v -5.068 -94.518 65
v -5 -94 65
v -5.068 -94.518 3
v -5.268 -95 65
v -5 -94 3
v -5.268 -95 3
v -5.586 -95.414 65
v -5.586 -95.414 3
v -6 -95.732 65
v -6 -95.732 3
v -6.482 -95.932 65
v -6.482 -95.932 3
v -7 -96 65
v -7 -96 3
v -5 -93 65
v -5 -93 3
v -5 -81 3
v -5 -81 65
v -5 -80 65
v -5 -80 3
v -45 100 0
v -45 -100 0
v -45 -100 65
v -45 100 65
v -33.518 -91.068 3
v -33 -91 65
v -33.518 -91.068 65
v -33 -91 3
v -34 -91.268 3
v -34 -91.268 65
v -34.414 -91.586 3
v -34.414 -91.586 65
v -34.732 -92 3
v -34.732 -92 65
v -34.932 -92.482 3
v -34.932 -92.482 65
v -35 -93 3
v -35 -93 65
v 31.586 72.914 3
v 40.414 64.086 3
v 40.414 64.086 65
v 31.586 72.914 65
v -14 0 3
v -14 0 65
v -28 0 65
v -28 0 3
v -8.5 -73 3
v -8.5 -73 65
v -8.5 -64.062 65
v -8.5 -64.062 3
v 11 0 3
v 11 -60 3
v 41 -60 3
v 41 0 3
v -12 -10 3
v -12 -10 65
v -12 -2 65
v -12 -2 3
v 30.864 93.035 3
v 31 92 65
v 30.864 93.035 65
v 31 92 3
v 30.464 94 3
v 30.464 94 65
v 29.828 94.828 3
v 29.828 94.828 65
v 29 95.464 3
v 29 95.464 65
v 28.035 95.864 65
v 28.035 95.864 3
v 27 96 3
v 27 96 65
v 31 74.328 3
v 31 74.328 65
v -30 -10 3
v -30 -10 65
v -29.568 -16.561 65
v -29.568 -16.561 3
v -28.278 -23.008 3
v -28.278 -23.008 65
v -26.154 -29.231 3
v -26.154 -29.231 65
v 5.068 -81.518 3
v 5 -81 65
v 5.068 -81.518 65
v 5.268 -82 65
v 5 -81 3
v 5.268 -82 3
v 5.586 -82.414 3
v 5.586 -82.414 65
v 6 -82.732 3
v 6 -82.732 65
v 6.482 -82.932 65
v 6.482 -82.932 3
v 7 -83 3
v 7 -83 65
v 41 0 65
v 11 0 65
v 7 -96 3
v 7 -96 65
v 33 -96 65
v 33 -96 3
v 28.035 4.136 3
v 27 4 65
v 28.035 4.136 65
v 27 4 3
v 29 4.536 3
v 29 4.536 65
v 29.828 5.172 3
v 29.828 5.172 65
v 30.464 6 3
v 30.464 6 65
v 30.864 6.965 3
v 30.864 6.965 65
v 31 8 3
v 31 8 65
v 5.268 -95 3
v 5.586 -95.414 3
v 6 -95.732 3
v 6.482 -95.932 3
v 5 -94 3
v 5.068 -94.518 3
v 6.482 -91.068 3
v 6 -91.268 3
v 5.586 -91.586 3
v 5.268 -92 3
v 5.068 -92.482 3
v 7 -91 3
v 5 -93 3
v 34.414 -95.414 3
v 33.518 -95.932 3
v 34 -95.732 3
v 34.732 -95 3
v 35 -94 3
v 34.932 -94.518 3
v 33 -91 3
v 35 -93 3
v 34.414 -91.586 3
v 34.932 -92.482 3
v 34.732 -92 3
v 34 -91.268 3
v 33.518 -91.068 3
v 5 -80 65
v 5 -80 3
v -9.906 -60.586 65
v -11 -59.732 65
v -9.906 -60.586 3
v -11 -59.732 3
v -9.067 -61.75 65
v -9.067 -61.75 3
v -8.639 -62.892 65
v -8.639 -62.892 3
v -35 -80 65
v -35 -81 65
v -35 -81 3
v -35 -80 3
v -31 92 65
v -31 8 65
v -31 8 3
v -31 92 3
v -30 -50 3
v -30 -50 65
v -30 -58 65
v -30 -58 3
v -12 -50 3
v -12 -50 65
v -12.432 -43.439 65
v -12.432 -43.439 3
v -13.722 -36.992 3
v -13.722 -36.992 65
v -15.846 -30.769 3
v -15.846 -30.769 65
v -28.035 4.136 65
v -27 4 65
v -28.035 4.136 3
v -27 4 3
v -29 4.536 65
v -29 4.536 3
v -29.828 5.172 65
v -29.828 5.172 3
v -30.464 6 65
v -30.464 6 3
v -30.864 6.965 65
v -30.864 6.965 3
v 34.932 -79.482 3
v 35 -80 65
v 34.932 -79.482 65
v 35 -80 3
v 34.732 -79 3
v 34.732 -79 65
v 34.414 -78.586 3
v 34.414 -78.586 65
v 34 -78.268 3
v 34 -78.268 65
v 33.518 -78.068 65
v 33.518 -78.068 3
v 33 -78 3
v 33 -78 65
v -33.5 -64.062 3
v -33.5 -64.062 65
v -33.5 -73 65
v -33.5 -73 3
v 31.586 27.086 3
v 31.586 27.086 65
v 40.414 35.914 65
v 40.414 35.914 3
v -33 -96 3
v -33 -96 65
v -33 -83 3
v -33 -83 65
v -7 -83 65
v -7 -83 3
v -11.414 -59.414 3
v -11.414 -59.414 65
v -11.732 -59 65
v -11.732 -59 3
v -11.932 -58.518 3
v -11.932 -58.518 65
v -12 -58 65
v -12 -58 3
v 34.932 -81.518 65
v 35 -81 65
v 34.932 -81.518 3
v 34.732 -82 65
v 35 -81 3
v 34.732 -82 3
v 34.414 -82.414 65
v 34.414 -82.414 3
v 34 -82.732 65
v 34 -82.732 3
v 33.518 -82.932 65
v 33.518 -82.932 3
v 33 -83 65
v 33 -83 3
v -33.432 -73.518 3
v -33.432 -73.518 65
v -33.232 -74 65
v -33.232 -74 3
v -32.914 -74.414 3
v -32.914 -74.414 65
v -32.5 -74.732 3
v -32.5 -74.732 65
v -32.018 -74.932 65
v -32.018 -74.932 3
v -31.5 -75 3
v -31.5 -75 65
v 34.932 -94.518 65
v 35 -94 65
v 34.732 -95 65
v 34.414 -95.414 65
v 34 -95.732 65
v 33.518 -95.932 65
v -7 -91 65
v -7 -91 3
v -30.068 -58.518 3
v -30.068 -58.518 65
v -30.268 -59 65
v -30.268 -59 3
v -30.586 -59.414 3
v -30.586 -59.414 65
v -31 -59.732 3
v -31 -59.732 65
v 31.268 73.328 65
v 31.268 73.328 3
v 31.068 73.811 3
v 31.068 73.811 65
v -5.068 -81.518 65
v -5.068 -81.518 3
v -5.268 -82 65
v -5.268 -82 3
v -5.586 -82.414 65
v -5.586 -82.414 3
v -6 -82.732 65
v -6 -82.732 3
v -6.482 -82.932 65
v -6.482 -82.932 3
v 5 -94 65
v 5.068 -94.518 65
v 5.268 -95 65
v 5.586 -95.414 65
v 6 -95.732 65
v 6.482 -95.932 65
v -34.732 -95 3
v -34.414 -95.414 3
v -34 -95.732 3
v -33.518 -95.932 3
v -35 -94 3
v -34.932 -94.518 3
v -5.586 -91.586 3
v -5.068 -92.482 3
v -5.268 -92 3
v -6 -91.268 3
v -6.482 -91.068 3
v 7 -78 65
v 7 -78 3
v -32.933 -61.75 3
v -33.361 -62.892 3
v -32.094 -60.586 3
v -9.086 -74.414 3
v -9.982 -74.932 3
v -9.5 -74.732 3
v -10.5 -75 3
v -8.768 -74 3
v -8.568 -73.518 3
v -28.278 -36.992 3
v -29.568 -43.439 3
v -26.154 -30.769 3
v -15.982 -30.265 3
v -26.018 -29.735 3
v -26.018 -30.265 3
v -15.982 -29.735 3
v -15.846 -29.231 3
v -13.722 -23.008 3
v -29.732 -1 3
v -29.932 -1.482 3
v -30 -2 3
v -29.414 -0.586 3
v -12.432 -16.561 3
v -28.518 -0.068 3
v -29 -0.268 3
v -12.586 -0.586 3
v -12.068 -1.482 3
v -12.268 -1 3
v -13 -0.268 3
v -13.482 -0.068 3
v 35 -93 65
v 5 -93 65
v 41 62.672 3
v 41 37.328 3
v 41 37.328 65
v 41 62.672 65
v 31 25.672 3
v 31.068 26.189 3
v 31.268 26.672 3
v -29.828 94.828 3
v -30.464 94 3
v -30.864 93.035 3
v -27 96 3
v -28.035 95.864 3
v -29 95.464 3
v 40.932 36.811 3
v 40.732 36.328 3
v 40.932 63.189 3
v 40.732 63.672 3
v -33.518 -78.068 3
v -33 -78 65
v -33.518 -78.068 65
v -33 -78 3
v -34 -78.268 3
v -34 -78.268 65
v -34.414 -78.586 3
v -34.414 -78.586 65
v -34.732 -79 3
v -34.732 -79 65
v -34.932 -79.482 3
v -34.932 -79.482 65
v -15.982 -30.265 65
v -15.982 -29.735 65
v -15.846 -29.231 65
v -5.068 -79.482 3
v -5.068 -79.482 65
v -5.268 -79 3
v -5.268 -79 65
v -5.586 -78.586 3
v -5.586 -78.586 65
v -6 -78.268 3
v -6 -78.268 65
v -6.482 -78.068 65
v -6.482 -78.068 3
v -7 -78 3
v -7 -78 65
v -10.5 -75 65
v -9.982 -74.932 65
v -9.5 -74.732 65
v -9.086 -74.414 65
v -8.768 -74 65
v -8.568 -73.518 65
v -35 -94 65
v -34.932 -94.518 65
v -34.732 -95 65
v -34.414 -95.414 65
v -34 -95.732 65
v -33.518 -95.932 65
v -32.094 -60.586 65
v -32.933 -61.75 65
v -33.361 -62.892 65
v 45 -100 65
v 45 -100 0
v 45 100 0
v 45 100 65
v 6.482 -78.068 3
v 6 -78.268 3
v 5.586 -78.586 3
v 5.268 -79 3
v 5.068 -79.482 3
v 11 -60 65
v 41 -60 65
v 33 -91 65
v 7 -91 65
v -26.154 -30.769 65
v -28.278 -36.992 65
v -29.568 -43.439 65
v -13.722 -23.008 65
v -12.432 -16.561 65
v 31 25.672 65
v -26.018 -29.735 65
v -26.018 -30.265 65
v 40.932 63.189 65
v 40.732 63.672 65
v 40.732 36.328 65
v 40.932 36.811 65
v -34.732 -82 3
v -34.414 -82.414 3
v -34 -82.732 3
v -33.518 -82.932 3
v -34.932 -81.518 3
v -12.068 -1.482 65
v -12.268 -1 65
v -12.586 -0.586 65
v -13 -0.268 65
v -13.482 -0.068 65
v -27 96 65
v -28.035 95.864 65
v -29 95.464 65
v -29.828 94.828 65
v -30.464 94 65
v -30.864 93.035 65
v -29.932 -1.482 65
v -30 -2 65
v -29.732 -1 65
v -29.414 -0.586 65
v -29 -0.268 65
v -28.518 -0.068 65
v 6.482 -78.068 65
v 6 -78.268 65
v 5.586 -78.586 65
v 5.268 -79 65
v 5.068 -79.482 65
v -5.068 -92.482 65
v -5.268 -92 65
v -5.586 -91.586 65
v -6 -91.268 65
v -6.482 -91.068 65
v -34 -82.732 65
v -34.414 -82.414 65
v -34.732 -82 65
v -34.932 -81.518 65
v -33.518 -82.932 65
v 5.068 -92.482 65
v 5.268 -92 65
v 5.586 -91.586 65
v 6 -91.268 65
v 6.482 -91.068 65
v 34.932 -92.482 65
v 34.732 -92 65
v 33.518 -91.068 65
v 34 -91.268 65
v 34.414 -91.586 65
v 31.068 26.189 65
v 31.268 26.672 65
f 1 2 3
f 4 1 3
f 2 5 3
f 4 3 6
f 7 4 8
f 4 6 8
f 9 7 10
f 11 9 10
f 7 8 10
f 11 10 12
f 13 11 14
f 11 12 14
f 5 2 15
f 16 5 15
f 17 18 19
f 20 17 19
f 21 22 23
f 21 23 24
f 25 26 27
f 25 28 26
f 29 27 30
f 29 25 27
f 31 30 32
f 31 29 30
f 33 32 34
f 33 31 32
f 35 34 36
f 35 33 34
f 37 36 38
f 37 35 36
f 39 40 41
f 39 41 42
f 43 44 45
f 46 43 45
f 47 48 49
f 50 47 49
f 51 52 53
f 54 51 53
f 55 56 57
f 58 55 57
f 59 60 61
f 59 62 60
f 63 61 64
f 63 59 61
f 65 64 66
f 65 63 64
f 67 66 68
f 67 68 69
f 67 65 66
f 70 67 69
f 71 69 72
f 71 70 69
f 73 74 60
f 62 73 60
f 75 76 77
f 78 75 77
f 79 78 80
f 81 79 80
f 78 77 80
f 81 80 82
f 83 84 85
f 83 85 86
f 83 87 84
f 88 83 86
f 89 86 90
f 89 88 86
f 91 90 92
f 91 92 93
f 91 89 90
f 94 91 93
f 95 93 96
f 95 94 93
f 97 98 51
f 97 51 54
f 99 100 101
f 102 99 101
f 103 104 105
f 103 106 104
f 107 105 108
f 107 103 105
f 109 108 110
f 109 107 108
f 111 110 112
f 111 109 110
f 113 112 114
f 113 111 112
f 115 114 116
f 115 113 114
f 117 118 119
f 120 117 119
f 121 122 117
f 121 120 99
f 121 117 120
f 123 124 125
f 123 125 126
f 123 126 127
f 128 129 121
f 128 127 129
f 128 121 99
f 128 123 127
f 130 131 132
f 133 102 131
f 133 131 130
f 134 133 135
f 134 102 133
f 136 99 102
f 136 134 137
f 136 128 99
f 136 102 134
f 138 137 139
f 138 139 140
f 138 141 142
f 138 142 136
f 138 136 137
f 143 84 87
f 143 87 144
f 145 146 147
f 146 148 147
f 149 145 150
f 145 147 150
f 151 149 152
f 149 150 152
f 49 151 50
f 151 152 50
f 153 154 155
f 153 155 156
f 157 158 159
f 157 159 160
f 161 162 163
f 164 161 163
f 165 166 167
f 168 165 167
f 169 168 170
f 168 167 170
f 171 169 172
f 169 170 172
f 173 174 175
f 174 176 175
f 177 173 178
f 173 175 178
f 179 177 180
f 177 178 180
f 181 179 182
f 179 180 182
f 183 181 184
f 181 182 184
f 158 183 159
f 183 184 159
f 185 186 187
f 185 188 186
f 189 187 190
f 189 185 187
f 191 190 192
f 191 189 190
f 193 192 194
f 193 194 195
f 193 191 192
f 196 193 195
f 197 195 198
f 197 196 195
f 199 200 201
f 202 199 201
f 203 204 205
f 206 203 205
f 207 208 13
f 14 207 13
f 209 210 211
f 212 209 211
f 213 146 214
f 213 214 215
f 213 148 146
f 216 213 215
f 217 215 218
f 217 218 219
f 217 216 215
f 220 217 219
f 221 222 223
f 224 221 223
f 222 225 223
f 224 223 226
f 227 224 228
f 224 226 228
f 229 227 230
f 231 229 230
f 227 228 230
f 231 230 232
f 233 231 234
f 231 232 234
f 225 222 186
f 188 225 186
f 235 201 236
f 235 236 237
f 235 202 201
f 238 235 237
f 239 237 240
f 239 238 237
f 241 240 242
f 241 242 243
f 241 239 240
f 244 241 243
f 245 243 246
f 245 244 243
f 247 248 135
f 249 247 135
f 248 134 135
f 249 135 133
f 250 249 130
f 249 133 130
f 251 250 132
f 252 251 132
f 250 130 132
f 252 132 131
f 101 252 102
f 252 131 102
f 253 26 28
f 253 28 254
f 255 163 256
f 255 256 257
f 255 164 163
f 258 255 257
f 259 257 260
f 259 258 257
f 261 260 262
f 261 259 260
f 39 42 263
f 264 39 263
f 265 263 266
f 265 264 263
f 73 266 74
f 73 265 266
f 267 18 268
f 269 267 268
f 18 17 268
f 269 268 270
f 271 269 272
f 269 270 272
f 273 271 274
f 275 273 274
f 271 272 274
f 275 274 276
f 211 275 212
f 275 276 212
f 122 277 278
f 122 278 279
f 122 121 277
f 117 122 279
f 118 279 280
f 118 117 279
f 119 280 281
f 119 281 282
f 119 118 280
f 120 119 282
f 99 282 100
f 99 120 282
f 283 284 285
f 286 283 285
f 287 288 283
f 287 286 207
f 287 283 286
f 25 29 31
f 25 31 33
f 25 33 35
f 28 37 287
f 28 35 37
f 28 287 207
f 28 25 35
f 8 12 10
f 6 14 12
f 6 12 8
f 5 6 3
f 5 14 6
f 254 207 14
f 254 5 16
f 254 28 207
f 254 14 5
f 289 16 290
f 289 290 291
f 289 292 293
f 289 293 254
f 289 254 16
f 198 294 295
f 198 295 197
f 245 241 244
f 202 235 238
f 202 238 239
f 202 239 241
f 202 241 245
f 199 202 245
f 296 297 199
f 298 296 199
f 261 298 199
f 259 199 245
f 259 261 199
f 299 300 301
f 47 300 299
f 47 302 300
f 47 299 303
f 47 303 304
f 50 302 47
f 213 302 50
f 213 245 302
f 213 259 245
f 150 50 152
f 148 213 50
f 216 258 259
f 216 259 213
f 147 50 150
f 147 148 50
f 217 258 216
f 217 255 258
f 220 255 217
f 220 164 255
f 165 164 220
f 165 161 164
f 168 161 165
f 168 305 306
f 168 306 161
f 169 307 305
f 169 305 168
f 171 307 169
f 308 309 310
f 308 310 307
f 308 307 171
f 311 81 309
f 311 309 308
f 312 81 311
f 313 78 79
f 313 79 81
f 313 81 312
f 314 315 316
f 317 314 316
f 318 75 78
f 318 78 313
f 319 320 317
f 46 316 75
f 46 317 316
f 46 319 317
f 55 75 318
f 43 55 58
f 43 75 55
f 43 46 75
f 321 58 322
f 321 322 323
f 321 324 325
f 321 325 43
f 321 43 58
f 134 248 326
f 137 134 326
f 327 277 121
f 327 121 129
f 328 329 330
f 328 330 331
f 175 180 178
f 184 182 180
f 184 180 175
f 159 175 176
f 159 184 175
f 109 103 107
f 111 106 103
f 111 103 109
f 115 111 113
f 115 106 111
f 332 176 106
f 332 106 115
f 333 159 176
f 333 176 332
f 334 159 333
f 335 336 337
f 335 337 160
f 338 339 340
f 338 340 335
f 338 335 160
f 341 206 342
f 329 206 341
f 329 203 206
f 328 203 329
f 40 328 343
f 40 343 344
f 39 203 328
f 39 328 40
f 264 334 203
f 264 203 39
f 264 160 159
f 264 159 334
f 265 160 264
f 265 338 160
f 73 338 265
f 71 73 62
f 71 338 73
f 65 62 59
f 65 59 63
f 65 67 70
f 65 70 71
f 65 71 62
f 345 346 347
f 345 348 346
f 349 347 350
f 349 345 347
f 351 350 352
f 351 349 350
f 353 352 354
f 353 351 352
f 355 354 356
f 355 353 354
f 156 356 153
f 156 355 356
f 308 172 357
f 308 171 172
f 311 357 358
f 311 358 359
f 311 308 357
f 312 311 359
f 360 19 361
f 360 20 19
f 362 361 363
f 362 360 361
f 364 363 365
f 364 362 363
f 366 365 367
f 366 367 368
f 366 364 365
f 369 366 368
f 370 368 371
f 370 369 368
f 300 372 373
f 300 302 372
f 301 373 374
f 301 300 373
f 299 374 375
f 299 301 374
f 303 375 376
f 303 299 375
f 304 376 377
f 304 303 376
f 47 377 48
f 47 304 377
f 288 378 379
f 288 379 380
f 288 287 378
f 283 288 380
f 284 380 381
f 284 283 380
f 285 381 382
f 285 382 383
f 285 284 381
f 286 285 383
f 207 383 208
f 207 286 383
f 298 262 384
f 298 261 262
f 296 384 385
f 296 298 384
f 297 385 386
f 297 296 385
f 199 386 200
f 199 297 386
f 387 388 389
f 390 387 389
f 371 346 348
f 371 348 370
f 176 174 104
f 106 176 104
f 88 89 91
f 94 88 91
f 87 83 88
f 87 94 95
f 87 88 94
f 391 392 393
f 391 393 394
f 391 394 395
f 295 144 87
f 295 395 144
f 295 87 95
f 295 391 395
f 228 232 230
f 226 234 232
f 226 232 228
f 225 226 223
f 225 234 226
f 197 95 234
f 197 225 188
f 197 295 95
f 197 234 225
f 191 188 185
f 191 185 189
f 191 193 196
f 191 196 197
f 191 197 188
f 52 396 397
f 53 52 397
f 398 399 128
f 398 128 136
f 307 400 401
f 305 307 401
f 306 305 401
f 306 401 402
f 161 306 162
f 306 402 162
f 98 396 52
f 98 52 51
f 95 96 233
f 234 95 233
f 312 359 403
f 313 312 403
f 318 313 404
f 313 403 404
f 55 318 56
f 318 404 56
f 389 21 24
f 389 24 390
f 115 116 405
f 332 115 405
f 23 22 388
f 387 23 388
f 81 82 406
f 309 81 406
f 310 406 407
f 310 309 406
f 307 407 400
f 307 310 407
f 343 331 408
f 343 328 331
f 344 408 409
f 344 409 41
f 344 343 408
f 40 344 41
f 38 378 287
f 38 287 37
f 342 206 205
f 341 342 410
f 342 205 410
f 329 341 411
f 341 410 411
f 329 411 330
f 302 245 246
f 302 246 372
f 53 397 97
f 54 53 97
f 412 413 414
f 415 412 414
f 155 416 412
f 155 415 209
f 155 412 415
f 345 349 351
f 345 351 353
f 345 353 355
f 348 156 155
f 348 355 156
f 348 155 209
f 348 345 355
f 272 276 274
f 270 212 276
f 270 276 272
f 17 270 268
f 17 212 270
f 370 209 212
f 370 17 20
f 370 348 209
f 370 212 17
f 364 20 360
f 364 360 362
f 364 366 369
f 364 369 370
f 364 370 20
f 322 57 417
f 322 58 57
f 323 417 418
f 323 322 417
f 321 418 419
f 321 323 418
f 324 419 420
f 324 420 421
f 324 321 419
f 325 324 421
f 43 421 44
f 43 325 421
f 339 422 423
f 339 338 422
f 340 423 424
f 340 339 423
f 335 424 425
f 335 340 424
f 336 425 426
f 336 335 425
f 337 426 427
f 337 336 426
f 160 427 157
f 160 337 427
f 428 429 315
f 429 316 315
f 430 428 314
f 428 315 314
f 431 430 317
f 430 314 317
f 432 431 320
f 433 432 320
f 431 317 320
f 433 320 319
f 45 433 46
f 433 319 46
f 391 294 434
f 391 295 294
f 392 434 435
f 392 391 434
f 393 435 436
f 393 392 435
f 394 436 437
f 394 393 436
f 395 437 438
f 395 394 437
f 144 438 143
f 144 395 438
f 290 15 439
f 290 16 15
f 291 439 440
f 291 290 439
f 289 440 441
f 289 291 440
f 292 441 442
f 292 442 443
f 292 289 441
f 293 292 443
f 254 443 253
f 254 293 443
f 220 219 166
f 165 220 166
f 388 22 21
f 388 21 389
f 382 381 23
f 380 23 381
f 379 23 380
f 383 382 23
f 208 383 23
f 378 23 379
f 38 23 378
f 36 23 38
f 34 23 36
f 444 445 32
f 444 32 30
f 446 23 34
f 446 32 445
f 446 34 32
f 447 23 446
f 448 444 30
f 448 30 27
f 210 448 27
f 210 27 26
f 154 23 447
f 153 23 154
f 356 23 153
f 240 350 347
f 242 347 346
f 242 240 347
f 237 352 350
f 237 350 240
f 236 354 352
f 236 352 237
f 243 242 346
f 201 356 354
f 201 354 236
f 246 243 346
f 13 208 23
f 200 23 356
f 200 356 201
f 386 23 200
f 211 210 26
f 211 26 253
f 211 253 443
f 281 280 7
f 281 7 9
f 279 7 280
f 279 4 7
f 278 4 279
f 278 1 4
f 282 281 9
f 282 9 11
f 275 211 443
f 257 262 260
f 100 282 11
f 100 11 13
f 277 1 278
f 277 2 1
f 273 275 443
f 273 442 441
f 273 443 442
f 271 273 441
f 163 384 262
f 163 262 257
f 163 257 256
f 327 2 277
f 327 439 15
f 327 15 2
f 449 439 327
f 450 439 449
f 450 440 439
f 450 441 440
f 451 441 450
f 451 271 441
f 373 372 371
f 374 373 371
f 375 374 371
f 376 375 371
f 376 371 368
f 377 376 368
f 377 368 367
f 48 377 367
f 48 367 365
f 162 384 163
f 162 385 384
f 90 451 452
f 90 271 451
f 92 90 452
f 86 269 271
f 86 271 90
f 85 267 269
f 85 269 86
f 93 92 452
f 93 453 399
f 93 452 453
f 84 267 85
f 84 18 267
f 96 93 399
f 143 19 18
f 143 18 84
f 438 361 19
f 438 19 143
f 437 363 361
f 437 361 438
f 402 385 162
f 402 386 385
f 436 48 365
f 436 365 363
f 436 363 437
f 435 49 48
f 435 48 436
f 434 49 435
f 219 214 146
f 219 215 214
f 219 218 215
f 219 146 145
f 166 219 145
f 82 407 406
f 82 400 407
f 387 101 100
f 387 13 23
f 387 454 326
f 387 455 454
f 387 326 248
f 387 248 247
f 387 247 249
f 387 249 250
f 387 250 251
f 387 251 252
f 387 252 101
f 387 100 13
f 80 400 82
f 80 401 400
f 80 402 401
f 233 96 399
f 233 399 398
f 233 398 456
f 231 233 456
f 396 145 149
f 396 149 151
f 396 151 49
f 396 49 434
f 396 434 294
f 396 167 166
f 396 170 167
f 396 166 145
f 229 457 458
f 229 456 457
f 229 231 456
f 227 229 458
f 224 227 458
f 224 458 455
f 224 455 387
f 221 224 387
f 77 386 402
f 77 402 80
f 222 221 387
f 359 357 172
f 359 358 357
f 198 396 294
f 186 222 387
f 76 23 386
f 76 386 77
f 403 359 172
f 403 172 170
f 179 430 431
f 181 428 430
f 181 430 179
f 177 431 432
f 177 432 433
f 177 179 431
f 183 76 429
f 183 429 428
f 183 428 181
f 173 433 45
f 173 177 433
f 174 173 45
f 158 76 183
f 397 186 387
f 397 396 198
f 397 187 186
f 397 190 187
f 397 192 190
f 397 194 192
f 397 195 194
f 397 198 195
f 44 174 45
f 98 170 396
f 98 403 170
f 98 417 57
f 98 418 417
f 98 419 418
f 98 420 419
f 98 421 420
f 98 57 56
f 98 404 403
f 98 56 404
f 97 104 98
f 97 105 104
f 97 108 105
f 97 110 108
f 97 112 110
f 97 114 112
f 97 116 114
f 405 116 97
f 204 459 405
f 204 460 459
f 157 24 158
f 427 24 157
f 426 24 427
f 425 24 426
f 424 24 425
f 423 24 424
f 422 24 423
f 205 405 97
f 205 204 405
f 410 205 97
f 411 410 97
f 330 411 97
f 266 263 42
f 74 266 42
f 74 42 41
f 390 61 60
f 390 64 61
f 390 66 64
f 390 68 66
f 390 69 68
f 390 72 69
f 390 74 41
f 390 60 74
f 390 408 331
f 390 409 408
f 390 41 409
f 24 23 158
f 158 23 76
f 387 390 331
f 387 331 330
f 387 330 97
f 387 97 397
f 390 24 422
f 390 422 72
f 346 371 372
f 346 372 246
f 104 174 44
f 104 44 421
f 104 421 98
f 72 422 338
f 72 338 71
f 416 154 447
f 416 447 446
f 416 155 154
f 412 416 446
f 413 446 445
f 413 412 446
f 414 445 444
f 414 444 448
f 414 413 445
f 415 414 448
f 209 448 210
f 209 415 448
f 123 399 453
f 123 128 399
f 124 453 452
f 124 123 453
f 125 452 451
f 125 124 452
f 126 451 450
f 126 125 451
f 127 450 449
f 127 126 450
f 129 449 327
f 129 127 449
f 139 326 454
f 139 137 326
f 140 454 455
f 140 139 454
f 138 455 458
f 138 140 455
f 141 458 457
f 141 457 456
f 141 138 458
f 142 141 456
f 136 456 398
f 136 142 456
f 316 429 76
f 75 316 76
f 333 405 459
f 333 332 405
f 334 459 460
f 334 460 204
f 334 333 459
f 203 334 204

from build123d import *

# Parameters (mm, degrees)
F0_W        = 90
F0_H        = 200
F1_DEPTH    = 65
F2_W        = 62
F2_H        = 92
F2_W_2      = 30
F2_H_2      = 60
F2_H_3      = 5
F3_DEPTH    = 62
F4_R        = 4
F6_W        = 10
F6_H        = 25
F7_DEPTH    = 62
F8_T4_DEPTH = 90.2885128676
F8_T9_DEPTH = 90.2885128676
F9_R        = 2
F10_R       = 5


# Not quite as in the source:
# - a fillet or chamfer that OpenCascade refuses, or shapes differently, is made with other operations: its cross-section is extruded or revolved along the edge and cut away or added


with BuildPart() as f1:
    # F0 (on Top) → F1 (new body)
    with BuildSketch(Plane.XY):
        Rectangle(F0_W, F0_H)
    extrude(amount=F1_DEPTH)

    # F2 (on face) → F3 (cut)
    with BuildSketch(Plane.XY.offset(65)):
        with Locations((0, 50)):
            Rectangle(F2_W, F2_H)
        with Locations((26, -30)):
            Rectangle(F2_W_2, F2_H_2)
        with Locations((20, -80.5)):
            Rectangle(F2_W_2, F2_H_3)
        with Locations((20, -93.5)):
            Rectangle(F2_W_2, F2_H_3)
        with Locations((-20, -93.5)):
            Rectangle(F2_W_2, F2_H_3)
        with Locations((-20, -80.5)):
            Rectangle(F2_W_2, F2_H_3)
        with BuildLine():
            Line((-12, 0), (-30, 0))
            Line((-30, 0), (-30, -10))
            ThreePointArc((-30, -10), (-28.9453156465, -20.2154821845), (-25.8257569496, -30))
            ThreePointArc((-25.8257569496, -30), (-28.9453156465, -39.7845178155), (-30, -50))
            Line((-30, -50), (-30, -60))
            Line((-30, -60), (-12, -60))
            Line((-12, -60), (-12, -50))
            ThreePointArc((-12, -50), (-13.0546843535, -39.7845178155), (-16.1742430504, -30))
            ThreePointArc((-16.1742430504, -30), (-13.0546843535, -20.2154821845), (-12, -10))
            Line((-12, -10), (-12, 0))
        make_face()
    extrude(amount=-F3_DEPTH, mode=Mode.SUBTRACT)

    # F4
    f4_edges = [f1.edges().sort_by_distance(p)[0] for p in [
        (-31, 96, 34),
        (31, 96, 34),
        (-31, 4, 34),
        (31, 4, 34),
    ]]
    fillet(f4_edges, radius=F4_R)

    # F6 (on face) → F7 (cut, through all)
    with BuildSketch(Plane.XY.offset(65)):
        with Locations((36, 50)):
            Rectangle(F6_W, F6_H)
        Polygon((-30, -60), (-33.5, -60), (-33.5, -75), (-8.5, -75), (-8.5, -60), (-12, -60), align=None)
    extrude(amount=-F7_DEPTH, mode=Mode.SUBTRACT)

    # F8: chamfer of 11 on 2 edges, made by hand


with BuildPart() as f8_tool2:
    # F8_s3 → F8_t4 (new body)
    with BuildSketch(Plane.XY.offset(93.2885128676)):
        Polygon((42, 62.5), (31, 73.5), (31, 62.5), align=None)
    extrude(amount=-F8_T4_DEPTH)

    split(bisect_by=Plane.YZ.offset(41), keep=Keep.BOTTOM)


with BuildPart() as f1_1:
    add(f1.part)

    # F8_t1: cut F8_tool2
    add(f8_tool2.part, mode=Mode.SUBTRACT)


with BuildPart() as f8_tool7:
    # F8_s8 → F8_t9 (new body)
    with BuildSketch(Plane.XY.offset(93.2885128676)):
        Polygon((31, 26.5), (42, 37.5), (31, 37.5), align=None)
    extrude(amount=-F8_T9_DEPTH)

    split(bisect_by=Plane.YZ.offset(41), keep=Keep.BOTTOM)


with BuildPart() as f1_2:
    add(f1_1.part)

    # F8_t6: cut F8_tool7
    add(f8_tool7.part, mode=Mode.SUBTRACT)

    # F9
    f9_edges = [f1_2.edges().sort_by_distance(p)[0] for p in [
        (31, 73.5, 34),
        (41, 63.5, 34),
        (41, 36.5, 34),
        (31, 26.5, 34),
        (-30, 0, 34),
        (-12, 0, 34),
        (-16.174243, -30, 34),
        (-25.825757, -30, 34),
        (-30, -60, 34),
        (-12, -60, 34),
        (-8.5, -75, 34),
        (-33.5, -75, 34),
        (-35, -78, 34),
        (-35, -91, 34),
        (5, -91, 34),
        (5, -78, 34),
        (-5, -91, 34),
        (-5, -78, 34),
        (35, -78, 34),
        (35, -91, 34),
        (-5, -83, 34),
        (-5, -96, 34),
        (35, -96, 34),
        (35, -83, 34),
        (5, -96, 34),
        (5, -83, 34),
        (-35, -83, 34),
        (-35, -96, 34),
    ]]
    fillet(f9_edges, radius=F9_R)

    # F10
    f10_edges = [f1_2.edges().sort_by_distance(p)[0] for p in [
        (-33.5, -60, 34),
        (-8.5, -60, 34),
    ]]
    fillet(f10_edges, radius=F10_R)


solid = f1_2.part
